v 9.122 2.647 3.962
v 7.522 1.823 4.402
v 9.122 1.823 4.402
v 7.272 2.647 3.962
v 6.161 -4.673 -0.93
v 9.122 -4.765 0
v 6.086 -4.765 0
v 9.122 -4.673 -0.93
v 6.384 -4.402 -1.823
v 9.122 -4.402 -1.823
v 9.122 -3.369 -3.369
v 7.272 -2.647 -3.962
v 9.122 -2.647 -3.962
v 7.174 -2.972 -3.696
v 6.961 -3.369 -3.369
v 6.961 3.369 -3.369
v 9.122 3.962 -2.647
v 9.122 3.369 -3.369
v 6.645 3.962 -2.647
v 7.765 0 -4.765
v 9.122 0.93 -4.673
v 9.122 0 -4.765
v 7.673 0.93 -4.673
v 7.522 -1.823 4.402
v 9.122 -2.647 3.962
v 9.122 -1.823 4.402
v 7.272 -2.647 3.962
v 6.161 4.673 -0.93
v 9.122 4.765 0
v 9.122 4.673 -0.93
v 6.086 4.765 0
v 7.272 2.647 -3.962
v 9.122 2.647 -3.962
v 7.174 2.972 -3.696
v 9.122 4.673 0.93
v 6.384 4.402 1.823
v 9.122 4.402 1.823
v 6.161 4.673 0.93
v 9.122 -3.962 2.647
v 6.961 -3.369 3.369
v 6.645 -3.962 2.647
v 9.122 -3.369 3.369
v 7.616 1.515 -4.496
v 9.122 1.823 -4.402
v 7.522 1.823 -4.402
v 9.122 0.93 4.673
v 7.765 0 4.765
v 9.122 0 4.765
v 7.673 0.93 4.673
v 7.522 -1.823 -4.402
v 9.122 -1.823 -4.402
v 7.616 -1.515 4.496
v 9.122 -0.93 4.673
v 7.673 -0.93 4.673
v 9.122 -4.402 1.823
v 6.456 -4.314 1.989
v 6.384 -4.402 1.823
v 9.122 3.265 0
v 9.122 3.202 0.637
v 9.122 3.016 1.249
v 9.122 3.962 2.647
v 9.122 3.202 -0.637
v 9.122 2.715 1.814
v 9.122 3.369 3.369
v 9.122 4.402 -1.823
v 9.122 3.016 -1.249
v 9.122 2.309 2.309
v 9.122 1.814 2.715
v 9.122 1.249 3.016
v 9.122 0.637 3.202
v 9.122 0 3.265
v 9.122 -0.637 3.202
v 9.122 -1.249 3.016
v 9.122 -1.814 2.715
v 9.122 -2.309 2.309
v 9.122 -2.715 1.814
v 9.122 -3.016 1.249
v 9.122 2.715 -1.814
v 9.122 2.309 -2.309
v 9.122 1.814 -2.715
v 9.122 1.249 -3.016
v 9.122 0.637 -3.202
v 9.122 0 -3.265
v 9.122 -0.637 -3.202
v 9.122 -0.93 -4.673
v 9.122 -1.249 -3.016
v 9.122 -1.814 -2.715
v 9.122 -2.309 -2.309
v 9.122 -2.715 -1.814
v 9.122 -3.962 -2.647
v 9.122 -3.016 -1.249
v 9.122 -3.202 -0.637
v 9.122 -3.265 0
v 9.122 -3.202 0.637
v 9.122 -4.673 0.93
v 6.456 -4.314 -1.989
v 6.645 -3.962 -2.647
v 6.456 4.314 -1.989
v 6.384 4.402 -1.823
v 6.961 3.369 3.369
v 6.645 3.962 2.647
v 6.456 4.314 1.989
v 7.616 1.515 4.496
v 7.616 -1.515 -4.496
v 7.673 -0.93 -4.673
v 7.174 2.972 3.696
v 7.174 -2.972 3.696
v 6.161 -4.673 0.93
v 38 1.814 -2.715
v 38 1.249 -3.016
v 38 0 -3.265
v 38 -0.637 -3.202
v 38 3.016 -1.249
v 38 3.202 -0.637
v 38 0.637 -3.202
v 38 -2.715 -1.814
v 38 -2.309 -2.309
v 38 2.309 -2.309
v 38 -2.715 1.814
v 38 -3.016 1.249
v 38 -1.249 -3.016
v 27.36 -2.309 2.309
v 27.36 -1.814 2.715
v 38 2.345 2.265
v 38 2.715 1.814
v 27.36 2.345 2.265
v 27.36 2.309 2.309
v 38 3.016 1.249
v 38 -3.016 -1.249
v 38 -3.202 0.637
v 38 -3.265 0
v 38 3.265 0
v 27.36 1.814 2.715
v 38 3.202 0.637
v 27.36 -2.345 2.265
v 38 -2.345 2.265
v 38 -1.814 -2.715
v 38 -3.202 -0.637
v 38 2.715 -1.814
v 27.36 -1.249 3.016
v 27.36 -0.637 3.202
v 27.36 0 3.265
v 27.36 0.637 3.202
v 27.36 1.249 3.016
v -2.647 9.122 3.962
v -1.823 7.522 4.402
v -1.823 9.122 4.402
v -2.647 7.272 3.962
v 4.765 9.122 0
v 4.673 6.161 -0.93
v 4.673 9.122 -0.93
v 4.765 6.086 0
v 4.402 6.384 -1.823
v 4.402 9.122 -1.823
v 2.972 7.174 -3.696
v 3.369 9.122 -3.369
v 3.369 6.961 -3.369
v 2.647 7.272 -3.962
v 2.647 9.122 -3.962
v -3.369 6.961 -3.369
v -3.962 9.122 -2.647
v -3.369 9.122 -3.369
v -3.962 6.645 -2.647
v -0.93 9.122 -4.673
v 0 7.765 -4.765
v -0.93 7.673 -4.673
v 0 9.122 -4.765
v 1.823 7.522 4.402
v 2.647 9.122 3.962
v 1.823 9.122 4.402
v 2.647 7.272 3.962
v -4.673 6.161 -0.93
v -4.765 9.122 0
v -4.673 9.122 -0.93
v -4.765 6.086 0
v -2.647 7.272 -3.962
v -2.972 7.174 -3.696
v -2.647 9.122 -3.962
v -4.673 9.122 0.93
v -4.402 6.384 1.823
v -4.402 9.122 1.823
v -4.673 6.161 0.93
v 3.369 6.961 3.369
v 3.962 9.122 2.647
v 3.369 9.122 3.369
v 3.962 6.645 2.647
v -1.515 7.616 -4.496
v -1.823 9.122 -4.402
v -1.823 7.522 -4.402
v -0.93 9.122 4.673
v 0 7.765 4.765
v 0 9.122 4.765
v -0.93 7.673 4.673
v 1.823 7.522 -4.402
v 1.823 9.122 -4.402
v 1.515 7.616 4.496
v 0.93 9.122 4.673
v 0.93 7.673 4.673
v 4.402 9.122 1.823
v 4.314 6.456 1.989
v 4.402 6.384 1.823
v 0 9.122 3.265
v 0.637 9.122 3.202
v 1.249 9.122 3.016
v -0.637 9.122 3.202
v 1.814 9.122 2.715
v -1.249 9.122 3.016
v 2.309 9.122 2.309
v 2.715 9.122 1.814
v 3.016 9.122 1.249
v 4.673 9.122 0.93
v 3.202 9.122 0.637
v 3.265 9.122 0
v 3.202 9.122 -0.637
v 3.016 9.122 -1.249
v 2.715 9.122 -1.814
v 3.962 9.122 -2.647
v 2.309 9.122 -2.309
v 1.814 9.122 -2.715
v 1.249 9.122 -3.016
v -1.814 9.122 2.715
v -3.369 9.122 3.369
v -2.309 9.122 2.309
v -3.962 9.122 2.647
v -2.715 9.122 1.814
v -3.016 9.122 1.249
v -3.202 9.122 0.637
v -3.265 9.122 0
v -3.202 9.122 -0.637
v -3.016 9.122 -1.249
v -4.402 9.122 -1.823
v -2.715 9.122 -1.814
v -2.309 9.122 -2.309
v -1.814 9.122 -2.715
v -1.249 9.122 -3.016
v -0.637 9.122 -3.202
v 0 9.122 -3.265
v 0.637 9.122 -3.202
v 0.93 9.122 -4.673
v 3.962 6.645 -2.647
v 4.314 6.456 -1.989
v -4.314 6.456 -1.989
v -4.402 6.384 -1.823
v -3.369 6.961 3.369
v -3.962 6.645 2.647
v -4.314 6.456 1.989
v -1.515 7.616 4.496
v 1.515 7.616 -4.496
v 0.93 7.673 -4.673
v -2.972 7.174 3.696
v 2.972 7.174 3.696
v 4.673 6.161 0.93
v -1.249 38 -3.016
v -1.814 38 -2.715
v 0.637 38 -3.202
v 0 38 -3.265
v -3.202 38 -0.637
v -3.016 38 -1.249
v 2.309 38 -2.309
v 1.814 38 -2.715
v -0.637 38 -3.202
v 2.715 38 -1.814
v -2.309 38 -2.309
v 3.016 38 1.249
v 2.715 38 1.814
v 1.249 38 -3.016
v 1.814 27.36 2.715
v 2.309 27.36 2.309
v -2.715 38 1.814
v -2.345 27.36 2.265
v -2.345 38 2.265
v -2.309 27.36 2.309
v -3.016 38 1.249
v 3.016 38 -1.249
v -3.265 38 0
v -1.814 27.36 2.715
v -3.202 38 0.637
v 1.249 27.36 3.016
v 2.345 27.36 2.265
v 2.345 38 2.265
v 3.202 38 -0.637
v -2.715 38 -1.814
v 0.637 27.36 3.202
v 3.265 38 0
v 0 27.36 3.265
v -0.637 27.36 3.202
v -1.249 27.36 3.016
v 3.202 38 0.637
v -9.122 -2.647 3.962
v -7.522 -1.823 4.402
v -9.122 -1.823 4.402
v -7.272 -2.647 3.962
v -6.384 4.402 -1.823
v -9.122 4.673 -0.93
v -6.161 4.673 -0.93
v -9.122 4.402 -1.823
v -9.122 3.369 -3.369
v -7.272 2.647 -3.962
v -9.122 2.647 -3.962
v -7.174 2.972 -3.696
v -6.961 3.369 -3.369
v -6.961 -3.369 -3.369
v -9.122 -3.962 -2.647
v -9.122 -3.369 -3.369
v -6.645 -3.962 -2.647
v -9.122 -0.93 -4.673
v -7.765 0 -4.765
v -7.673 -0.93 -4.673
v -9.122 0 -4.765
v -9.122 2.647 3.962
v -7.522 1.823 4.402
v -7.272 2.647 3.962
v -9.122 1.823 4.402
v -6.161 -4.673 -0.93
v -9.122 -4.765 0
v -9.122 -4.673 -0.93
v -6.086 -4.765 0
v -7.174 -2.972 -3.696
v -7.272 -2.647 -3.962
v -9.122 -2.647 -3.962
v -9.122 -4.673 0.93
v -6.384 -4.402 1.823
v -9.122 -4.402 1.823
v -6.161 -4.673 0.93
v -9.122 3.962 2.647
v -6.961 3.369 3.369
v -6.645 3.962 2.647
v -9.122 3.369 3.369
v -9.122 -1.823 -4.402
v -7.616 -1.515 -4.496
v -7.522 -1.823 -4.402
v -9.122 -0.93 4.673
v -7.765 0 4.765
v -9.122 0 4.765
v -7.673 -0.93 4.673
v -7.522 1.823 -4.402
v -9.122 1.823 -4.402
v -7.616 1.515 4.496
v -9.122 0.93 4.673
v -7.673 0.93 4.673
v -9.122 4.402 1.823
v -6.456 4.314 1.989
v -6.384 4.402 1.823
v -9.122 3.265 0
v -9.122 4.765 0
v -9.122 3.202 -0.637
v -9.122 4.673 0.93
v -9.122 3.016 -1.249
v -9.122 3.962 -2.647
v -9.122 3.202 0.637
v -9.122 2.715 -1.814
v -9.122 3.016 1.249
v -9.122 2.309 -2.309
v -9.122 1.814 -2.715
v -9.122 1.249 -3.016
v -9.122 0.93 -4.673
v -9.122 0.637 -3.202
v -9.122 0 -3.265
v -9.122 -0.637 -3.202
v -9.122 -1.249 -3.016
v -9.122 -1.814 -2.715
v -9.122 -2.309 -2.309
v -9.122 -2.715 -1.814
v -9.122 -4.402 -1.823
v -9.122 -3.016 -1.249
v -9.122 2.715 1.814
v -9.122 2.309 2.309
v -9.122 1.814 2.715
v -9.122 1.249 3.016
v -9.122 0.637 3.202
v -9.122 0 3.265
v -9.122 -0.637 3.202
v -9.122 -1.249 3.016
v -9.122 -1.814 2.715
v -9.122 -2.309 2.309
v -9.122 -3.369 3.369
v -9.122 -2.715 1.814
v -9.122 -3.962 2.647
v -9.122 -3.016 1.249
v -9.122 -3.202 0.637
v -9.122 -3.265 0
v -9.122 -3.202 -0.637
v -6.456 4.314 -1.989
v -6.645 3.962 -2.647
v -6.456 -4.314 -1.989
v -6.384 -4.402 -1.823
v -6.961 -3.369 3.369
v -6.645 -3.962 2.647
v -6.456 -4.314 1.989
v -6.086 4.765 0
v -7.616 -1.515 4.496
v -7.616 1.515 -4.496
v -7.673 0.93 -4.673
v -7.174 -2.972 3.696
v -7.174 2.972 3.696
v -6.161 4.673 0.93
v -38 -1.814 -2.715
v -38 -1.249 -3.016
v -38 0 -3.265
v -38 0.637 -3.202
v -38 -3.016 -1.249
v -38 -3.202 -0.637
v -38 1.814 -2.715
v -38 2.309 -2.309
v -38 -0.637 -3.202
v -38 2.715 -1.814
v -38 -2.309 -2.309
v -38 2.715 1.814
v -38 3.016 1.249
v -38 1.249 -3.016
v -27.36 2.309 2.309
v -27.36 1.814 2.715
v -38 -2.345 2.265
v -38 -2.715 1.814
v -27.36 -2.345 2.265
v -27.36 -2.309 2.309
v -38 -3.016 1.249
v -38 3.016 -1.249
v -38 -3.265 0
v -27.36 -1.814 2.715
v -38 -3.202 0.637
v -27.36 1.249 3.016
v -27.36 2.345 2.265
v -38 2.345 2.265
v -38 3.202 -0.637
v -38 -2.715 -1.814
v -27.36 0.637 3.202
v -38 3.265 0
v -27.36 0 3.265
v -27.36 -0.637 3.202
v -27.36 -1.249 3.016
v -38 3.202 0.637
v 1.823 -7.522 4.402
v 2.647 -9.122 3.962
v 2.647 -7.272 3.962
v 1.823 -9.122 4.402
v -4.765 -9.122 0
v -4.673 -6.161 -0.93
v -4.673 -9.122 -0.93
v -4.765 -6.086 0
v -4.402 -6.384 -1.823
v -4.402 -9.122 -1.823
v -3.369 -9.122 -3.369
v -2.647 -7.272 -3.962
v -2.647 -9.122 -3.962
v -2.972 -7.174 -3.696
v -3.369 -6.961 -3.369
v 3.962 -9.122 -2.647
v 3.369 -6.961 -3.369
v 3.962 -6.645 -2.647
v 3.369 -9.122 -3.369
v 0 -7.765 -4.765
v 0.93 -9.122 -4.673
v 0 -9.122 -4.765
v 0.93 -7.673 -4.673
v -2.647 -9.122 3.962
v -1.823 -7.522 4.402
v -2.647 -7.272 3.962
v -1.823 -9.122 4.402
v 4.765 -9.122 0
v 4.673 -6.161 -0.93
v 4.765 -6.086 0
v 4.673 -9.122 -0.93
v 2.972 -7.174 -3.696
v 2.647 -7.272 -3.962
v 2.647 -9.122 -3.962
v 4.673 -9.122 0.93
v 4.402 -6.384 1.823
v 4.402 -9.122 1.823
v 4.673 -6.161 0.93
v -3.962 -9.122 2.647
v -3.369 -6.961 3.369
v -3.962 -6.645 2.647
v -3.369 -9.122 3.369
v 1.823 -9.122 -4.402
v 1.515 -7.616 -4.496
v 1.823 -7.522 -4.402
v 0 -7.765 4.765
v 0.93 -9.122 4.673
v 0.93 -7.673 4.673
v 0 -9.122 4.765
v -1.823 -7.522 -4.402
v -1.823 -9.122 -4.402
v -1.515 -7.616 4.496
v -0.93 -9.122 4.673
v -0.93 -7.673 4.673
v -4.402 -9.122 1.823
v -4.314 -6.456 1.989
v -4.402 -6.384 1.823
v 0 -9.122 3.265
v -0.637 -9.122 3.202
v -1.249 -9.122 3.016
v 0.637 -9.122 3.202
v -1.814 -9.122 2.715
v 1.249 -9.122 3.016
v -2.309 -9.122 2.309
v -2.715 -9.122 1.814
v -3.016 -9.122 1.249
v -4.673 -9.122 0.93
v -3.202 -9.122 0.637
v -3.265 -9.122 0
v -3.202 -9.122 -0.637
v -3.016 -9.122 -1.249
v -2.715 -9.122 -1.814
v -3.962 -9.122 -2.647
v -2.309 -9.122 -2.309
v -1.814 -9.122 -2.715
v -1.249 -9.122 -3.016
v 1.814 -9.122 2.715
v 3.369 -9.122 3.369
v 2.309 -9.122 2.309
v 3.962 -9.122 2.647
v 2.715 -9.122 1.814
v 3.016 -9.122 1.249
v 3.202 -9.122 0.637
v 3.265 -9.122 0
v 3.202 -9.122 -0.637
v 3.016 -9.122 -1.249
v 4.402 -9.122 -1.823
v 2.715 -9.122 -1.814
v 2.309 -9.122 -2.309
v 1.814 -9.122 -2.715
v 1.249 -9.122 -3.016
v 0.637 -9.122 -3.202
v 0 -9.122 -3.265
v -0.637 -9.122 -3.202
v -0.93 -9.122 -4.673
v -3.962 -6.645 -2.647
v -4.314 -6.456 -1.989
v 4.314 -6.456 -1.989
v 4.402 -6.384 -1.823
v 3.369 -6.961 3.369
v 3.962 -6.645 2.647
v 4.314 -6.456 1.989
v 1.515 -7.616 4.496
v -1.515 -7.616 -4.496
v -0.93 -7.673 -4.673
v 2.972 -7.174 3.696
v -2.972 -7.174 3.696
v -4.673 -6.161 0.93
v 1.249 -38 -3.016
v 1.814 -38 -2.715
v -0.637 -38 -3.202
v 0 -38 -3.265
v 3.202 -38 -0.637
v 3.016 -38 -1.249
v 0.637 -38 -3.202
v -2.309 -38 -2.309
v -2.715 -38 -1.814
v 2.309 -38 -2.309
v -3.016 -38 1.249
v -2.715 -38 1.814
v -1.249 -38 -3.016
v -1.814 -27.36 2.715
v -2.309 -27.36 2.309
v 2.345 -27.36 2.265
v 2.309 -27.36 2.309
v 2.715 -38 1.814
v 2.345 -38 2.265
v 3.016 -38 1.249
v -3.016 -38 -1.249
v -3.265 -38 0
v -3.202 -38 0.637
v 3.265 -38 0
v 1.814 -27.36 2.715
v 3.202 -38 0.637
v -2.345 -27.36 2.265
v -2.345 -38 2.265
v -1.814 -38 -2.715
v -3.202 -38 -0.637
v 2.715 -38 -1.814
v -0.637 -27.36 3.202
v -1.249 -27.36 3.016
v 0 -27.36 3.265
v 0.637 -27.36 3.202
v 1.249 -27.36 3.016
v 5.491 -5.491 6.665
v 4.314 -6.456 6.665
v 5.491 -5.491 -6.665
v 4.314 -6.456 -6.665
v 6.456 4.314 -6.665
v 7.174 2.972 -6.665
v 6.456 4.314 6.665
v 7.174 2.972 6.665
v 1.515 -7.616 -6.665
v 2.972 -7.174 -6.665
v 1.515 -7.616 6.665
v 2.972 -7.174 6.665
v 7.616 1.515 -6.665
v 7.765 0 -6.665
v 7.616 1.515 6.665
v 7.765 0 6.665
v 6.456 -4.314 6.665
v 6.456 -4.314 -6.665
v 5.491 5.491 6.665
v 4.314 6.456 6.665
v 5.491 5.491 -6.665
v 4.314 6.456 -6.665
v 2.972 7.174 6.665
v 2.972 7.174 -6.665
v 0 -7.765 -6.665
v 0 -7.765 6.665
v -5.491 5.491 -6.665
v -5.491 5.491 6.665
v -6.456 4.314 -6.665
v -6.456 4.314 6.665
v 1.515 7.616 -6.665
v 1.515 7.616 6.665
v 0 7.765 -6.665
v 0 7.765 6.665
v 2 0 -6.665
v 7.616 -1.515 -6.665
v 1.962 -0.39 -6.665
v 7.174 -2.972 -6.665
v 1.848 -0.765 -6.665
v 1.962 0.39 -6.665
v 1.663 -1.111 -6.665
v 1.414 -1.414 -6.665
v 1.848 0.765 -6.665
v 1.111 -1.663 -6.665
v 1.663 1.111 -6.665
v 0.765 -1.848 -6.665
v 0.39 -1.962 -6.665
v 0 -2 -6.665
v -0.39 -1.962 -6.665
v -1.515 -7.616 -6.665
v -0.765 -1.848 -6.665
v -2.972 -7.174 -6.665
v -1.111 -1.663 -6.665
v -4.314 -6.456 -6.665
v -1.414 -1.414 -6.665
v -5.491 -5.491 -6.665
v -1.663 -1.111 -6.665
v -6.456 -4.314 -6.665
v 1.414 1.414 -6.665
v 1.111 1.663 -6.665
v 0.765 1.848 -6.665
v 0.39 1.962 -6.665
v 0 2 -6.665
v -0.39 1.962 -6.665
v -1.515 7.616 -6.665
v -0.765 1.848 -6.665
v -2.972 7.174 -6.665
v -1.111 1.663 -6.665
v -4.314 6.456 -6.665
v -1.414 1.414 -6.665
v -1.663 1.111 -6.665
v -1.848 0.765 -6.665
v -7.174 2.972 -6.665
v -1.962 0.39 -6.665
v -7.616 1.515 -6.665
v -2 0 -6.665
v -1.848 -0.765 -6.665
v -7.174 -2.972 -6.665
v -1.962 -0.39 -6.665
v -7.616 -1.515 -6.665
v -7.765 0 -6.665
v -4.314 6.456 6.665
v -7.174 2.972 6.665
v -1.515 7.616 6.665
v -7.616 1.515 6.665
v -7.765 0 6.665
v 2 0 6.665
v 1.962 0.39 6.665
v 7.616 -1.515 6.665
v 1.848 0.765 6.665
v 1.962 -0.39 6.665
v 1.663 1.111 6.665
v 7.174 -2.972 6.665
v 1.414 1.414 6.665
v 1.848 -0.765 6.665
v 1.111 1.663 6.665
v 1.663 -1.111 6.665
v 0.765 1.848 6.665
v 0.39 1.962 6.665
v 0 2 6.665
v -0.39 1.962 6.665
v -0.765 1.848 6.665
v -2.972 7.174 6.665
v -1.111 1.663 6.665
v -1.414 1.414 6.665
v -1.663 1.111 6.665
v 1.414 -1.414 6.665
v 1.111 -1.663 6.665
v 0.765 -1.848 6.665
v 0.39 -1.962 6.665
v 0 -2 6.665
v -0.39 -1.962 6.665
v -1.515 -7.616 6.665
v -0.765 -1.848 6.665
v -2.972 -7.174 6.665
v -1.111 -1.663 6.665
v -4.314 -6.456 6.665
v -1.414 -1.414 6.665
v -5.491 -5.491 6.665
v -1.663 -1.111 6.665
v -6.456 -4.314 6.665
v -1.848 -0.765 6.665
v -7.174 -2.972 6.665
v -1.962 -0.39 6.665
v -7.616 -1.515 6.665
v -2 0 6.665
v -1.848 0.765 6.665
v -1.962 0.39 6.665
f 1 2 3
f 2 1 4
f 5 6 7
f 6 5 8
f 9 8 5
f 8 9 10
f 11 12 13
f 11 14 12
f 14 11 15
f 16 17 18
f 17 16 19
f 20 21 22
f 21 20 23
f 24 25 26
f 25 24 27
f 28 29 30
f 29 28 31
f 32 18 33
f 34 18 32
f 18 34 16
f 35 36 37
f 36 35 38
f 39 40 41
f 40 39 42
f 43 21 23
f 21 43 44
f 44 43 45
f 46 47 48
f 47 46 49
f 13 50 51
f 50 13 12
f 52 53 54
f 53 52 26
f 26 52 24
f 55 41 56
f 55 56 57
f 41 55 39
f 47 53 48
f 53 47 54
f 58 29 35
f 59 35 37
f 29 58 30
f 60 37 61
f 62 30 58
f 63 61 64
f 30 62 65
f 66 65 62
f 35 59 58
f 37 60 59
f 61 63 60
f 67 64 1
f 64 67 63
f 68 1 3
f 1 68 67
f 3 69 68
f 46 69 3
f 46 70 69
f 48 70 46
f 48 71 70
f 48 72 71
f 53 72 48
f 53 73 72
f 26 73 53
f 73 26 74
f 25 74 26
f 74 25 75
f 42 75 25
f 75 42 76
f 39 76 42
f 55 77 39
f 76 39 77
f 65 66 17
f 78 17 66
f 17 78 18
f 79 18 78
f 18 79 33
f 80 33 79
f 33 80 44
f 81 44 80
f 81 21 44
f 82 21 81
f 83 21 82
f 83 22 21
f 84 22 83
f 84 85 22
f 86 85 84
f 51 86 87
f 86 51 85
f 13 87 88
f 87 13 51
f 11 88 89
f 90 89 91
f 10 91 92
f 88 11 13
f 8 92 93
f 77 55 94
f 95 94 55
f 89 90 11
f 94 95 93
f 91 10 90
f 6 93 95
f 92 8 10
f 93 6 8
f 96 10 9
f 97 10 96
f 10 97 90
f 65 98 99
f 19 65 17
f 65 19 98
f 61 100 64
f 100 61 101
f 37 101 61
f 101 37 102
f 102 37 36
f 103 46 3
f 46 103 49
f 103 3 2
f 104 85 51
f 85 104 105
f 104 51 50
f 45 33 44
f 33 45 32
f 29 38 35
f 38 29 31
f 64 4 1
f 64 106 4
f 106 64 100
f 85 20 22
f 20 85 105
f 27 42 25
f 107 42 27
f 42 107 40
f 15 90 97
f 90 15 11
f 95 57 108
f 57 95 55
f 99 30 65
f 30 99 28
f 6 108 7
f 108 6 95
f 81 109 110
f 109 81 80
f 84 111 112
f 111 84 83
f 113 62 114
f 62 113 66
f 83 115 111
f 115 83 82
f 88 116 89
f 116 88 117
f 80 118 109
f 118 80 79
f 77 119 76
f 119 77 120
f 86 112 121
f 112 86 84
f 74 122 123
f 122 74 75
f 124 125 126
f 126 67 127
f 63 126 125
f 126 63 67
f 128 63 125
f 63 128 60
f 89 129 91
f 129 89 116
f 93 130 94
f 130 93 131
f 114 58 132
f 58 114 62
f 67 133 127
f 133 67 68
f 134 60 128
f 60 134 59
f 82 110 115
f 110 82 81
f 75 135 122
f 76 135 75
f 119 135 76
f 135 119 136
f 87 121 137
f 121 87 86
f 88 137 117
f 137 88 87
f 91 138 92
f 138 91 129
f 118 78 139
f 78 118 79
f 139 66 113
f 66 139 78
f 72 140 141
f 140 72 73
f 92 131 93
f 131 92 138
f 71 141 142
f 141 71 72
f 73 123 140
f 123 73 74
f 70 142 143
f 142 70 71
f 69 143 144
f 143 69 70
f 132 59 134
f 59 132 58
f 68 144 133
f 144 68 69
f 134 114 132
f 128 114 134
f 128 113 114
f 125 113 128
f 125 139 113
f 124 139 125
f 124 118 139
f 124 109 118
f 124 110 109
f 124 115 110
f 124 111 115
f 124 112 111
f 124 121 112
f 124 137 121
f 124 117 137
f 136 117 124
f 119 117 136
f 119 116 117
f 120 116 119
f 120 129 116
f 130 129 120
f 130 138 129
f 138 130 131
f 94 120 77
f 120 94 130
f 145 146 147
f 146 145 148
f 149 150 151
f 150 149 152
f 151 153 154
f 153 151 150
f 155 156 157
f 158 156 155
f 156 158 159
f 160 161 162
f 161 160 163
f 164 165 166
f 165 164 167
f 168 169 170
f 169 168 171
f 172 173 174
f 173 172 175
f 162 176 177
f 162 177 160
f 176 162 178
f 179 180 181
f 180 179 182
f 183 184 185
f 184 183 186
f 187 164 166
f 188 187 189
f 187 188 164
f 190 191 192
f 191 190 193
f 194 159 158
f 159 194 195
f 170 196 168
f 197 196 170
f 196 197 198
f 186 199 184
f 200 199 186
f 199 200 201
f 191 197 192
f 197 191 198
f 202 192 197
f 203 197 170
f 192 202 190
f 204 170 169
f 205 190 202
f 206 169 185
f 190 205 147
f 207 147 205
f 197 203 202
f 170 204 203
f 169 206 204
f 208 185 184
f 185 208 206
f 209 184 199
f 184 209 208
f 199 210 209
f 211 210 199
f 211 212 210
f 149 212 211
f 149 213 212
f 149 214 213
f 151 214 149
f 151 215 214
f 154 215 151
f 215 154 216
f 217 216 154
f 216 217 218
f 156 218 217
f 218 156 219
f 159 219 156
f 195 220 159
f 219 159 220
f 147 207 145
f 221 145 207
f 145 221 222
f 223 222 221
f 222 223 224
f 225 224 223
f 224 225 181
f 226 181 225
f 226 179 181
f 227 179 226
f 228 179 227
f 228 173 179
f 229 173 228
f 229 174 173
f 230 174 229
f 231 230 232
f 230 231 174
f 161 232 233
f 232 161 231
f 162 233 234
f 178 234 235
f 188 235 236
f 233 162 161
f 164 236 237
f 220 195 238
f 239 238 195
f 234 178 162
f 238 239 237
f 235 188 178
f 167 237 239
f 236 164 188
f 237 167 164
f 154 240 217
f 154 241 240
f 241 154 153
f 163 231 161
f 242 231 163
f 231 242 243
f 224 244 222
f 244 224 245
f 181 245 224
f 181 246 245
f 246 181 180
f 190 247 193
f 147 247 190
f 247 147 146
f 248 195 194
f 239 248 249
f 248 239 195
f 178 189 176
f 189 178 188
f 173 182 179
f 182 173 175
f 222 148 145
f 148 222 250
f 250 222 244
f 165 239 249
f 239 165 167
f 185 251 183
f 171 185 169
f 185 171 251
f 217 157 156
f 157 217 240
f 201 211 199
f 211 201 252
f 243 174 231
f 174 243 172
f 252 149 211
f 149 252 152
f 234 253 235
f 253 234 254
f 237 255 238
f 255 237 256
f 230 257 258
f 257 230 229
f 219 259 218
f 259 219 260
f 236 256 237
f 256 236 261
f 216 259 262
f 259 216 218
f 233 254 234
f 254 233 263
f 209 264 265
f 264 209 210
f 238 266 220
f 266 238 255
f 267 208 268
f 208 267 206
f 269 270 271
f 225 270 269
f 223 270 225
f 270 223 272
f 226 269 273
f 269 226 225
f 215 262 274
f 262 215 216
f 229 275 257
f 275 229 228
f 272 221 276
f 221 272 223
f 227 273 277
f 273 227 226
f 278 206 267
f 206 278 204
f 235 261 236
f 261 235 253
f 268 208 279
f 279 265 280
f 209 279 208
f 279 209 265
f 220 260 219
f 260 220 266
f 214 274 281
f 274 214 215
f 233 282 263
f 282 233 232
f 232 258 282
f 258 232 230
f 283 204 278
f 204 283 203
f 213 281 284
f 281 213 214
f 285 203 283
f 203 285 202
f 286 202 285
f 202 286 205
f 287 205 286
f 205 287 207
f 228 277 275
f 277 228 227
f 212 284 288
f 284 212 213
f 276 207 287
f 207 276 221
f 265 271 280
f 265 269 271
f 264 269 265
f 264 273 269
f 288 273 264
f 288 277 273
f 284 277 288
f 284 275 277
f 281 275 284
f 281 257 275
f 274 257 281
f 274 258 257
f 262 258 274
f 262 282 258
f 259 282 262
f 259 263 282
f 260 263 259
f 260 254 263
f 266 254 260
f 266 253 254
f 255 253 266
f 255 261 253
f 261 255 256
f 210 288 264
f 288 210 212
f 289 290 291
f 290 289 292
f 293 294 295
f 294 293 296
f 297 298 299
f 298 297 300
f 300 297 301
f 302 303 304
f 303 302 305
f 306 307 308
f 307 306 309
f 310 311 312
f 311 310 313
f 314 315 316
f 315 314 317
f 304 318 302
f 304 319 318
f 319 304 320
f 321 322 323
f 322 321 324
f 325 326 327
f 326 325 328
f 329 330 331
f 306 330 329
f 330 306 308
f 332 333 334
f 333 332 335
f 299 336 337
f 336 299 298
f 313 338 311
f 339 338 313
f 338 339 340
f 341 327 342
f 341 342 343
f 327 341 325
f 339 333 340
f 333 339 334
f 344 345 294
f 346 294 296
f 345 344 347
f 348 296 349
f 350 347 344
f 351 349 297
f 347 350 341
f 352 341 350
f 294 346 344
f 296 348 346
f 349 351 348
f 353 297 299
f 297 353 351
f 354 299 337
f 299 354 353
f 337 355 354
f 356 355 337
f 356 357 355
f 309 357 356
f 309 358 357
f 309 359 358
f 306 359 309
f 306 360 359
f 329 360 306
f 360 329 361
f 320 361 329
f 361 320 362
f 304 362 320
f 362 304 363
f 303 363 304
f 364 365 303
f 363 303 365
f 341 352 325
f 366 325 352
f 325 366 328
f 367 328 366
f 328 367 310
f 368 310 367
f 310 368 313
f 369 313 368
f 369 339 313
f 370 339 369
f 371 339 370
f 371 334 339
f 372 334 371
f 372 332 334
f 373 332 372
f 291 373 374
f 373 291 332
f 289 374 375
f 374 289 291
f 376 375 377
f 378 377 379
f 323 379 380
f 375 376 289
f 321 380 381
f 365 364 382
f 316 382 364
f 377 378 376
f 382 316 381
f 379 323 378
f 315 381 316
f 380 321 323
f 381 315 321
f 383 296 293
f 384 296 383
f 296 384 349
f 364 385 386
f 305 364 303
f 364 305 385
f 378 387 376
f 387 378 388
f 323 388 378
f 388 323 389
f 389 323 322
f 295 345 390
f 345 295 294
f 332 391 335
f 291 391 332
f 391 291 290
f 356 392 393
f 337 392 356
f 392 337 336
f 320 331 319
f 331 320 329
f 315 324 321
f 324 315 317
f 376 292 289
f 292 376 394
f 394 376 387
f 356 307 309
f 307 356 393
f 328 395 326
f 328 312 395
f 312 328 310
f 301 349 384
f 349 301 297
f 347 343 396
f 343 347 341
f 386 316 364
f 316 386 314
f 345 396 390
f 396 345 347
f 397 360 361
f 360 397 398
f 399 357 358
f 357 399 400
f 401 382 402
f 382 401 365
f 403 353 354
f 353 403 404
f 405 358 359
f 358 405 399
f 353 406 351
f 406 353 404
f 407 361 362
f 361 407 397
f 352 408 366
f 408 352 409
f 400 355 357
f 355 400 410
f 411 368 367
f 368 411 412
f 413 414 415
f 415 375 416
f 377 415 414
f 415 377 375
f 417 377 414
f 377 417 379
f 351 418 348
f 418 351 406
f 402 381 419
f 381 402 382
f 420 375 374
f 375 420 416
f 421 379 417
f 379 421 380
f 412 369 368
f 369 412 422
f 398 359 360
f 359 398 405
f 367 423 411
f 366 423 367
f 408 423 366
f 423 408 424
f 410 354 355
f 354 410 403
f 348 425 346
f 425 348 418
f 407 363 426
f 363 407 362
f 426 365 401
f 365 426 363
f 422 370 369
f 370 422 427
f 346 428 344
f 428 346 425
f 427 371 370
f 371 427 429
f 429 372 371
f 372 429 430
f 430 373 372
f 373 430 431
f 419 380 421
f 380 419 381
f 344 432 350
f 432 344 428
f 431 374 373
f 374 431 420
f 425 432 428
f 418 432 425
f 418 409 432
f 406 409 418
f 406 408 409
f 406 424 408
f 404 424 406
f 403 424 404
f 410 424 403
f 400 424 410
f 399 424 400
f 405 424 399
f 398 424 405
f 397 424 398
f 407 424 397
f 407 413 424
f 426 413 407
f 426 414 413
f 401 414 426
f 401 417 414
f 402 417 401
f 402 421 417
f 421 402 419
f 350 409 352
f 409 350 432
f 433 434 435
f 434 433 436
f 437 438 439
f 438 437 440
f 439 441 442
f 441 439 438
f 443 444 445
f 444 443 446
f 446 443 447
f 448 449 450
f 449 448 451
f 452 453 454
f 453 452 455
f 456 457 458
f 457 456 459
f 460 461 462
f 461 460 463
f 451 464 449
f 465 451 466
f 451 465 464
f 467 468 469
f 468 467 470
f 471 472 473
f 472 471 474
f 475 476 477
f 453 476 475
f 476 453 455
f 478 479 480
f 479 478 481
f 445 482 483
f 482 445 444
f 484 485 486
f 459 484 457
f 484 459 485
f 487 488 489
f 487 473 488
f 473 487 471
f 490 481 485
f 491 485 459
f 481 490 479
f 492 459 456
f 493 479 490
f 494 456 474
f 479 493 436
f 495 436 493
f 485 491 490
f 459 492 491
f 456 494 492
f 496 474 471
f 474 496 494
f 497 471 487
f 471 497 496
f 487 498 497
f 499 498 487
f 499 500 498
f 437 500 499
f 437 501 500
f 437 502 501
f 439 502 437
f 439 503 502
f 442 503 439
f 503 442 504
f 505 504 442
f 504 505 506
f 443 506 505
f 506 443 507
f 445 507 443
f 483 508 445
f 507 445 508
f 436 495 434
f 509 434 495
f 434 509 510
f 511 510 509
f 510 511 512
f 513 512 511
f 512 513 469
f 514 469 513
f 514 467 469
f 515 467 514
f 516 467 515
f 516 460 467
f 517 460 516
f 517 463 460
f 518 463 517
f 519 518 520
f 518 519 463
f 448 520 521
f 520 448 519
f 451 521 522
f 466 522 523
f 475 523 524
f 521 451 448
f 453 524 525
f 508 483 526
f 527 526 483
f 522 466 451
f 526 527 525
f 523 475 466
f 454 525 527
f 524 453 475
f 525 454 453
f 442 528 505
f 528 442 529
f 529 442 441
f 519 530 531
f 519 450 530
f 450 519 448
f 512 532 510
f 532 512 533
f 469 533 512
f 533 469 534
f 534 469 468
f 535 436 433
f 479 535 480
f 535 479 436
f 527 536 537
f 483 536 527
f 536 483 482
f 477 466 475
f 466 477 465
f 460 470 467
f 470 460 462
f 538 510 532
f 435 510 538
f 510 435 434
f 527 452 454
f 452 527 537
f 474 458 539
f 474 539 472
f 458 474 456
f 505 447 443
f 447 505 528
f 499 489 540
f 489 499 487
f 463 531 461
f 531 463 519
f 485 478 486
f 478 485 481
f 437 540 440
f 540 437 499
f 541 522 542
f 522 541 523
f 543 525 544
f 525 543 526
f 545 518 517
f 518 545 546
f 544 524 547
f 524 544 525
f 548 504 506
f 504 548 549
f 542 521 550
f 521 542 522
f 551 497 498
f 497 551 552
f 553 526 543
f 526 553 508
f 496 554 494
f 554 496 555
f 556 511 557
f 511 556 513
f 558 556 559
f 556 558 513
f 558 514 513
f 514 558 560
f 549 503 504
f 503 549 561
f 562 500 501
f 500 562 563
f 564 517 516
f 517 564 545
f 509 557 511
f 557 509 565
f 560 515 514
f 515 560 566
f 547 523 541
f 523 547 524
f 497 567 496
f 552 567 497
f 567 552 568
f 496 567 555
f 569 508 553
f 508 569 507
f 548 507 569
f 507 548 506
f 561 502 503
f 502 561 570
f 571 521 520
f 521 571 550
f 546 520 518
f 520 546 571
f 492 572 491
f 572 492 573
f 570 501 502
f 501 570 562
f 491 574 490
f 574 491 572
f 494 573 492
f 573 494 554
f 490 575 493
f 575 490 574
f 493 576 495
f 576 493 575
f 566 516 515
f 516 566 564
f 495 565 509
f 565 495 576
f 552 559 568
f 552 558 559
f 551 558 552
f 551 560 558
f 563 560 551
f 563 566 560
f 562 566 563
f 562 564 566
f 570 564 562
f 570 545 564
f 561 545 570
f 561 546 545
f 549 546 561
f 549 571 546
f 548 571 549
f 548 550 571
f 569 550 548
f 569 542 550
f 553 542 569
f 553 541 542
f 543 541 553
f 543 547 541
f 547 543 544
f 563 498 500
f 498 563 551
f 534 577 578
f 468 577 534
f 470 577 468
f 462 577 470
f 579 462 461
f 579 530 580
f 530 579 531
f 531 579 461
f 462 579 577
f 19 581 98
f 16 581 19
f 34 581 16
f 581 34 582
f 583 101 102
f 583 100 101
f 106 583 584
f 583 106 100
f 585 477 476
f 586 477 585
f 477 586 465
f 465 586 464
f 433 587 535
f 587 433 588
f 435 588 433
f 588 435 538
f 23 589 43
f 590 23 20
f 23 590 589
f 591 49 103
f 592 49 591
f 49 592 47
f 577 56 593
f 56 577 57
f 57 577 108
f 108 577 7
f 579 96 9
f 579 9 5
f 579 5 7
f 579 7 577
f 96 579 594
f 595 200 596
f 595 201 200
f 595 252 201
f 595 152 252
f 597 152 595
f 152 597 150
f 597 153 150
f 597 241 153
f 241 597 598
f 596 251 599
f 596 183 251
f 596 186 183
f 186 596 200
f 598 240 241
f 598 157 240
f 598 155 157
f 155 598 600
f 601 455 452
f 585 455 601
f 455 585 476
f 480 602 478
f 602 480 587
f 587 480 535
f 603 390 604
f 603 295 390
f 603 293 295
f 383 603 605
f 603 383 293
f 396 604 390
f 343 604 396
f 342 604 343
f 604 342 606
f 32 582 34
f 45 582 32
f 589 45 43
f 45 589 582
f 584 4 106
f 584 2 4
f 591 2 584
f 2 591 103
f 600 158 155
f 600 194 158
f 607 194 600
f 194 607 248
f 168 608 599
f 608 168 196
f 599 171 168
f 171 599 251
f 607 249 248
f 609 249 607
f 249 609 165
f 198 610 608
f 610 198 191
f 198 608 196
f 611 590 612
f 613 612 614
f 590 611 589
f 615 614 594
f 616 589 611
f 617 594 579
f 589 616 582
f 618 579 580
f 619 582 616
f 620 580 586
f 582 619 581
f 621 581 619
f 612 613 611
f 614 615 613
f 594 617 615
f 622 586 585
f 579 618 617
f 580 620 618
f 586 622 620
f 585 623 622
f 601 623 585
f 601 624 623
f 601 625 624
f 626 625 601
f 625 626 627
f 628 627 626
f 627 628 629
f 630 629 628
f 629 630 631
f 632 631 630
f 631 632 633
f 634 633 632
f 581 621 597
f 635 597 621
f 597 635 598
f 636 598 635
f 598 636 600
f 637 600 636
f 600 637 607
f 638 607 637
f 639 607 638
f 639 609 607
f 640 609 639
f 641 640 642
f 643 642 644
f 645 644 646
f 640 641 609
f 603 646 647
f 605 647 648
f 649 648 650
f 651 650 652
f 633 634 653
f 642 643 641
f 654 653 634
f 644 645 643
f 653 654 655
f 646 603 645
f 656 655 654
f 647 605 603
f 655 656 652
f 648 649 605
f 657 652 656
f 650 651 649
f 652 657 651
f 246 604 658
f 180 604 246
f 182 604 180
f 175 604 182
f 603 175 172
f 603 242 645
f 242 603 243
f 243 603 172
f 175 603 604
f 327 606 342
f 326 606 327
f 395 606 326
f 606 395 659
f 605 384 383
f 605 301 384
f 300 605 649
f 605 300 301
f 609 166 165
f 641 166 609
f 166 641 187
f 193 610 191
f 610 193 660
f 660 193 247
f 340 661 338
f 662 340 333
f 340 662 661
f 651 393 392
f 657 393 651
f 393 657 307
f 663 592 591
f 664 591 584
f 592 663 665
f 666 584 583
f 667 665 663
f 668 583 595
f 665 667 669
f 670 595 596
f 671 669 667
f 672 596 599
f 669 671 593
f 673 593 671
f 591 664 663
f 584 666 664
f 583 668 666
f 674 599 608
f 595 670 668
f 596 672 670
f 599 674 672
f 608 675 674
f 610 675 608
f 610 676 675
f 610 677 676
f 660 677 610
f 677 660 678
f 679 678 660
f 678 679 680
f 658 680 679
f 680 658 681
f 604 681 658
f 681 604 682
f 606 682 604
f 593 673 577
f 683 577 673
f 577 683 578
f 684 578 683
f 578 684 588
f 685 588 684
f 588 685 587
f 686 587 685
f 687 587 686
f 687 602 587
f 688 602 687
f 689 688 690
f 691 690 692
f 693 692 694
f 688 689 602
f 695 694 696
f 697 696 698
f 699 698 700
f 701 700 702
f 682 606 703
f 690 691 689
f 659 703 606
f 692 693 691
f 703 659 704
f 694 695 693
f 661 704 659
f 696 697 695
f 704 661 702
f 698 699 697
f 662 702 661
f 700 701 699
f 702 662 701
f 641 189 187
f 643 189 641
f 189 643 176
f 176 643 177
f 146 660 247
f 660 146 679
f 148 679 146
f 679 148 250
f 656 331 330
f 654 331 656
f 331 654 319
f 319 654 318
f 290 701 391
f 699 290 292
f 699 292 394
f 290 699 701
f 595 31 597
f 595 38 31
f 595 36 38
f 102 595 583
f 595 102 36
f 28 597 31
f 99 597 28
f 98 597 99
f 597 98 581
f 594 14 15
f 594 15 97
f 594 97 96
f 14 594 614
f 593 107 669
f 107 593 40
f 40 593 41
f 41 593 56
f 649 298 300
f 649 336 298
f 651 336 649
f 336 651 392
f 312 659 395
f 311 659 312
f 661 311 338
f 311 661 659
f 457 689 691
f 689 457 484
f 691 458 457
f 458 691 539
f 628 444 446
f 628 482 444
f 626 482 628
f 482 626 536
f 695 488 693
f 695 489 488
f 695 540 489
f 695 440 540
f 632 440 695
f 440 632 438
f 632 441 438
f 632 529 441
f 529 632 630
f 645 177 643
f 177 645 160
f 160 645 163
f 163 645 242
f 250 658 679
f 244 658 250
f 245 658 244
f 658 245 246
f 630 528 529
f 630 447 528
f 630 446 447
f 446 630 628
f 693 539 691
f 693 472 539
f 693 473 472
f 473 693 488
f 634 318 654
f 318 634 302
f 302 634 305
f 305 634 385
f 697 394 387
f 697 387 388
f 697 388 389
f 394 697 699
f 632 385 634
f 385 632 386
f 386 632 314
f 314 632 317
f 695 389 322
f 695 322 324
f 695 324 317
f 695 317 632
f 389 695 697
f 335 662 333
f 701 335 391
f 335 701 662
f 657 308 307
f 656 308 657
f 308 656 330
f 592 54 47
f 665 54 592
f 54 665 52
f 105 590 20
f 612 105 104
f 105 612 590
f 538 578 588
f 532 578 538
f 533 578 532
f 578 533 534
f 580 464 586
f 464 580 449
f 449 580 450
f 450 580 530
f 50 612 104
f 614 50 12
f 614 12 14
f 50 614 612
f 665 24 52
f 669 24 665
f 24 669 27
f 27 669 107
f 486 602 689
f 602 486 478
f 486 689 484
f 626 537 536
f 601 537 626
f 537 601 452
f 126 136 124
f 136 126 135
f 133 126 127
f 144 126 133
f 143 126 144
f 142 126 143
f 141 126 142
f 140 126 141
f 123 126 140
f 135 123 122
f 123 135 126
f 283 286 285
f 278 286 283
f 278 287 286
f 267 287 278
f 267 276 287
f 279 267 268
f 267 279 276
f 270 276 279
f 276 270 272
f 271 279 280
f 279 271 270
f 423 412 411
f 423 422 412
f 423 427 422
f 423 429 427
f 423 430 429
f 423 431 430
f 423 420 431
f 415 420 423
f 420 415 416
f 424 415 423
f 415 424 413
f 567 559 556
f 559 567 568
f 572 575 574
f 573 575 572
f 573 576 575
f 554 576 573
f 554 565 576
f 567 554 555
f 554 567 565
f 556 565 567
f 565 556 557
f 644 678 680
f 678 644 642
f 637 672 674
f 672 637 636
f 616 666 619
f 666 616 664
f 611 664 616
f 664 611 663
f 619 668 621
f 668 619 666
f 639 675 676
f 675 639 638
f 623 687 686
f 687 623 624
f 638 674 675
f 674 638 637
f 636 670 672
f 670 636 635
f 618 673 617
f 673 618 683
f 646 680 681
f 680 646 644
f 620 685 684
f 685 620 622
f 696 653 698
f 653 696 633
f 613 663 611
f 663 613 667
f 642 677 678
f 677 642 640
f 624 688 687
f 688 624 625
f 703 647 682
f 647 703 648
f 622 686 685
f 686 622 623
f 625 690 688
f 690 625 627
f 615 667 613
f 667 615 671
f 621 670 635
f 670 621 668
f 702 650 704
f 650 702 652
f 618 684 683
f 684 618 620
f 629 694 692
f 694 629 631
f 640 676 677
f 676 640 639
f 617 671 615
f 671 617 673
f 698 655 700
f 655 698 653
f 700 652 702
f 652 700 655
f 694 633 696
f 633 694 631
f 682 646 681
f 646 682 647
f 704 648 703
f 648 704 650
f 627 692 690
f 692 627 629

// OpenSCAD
$fn = 32;

// ----------------------------------------------------------------------
// Cardan cross: 76 mm span, 9.53 mm trunnions
// ----------------------------------------------------------------------

// --- parameters (mm) ---
journal_d = 9.53;         // trunnion diameter
arm_len = 38;             // trunnion length from the centre
step_r = 3.24;            // step position from the centre
step_d = 6.53;            // journal diameter after the step
hub_d = 15.53;            // hub diameter
hub_h = 13.33;            // hub height
bore_d = 4;               // hub bore
flat_d = 1;               // depth of the journal flat
flat_len = 10.64;         // length of the journal flat

difference() {
  union() {
    /* hub along the joint axis */
    cylinder(h = hub_h, d = hub_d, center = true);
    for (a = [0 : 90 : 270]) rotate([0, 0, a]) {
      /* trunnion, sunk into the hub */
      translate([hub_d / 4, 0, 0]) rotate([0, 90, 0]) cylinder(h = step_r + 2, d = journal_d);
      /* stepped journal out to the tip */
      translate([step_r - 0.5, 0, 0]) rotate([0, 90, 0]) cylinder(h = arm_len + 0.5 - step_r, d = step_d);
    }
  }
  /* lubrication bore through the hub, 2.5 mm clear on both sides */
  translate([0, 0, -hub_h / 2 - 2.5]) cylinder(h = hub_h + 5, d = bore_d);
  /* machined flat on each journal tip */
  for (a = [0 : 90 : 270]) rotate([0, 0, a]) {
    translate([arm_len - flat_len, -step_d, step_d / 2 - flat_d]) cube([flat_len + 0.5, 2 * step_d, flat_d + 2.5]);
  }
}
